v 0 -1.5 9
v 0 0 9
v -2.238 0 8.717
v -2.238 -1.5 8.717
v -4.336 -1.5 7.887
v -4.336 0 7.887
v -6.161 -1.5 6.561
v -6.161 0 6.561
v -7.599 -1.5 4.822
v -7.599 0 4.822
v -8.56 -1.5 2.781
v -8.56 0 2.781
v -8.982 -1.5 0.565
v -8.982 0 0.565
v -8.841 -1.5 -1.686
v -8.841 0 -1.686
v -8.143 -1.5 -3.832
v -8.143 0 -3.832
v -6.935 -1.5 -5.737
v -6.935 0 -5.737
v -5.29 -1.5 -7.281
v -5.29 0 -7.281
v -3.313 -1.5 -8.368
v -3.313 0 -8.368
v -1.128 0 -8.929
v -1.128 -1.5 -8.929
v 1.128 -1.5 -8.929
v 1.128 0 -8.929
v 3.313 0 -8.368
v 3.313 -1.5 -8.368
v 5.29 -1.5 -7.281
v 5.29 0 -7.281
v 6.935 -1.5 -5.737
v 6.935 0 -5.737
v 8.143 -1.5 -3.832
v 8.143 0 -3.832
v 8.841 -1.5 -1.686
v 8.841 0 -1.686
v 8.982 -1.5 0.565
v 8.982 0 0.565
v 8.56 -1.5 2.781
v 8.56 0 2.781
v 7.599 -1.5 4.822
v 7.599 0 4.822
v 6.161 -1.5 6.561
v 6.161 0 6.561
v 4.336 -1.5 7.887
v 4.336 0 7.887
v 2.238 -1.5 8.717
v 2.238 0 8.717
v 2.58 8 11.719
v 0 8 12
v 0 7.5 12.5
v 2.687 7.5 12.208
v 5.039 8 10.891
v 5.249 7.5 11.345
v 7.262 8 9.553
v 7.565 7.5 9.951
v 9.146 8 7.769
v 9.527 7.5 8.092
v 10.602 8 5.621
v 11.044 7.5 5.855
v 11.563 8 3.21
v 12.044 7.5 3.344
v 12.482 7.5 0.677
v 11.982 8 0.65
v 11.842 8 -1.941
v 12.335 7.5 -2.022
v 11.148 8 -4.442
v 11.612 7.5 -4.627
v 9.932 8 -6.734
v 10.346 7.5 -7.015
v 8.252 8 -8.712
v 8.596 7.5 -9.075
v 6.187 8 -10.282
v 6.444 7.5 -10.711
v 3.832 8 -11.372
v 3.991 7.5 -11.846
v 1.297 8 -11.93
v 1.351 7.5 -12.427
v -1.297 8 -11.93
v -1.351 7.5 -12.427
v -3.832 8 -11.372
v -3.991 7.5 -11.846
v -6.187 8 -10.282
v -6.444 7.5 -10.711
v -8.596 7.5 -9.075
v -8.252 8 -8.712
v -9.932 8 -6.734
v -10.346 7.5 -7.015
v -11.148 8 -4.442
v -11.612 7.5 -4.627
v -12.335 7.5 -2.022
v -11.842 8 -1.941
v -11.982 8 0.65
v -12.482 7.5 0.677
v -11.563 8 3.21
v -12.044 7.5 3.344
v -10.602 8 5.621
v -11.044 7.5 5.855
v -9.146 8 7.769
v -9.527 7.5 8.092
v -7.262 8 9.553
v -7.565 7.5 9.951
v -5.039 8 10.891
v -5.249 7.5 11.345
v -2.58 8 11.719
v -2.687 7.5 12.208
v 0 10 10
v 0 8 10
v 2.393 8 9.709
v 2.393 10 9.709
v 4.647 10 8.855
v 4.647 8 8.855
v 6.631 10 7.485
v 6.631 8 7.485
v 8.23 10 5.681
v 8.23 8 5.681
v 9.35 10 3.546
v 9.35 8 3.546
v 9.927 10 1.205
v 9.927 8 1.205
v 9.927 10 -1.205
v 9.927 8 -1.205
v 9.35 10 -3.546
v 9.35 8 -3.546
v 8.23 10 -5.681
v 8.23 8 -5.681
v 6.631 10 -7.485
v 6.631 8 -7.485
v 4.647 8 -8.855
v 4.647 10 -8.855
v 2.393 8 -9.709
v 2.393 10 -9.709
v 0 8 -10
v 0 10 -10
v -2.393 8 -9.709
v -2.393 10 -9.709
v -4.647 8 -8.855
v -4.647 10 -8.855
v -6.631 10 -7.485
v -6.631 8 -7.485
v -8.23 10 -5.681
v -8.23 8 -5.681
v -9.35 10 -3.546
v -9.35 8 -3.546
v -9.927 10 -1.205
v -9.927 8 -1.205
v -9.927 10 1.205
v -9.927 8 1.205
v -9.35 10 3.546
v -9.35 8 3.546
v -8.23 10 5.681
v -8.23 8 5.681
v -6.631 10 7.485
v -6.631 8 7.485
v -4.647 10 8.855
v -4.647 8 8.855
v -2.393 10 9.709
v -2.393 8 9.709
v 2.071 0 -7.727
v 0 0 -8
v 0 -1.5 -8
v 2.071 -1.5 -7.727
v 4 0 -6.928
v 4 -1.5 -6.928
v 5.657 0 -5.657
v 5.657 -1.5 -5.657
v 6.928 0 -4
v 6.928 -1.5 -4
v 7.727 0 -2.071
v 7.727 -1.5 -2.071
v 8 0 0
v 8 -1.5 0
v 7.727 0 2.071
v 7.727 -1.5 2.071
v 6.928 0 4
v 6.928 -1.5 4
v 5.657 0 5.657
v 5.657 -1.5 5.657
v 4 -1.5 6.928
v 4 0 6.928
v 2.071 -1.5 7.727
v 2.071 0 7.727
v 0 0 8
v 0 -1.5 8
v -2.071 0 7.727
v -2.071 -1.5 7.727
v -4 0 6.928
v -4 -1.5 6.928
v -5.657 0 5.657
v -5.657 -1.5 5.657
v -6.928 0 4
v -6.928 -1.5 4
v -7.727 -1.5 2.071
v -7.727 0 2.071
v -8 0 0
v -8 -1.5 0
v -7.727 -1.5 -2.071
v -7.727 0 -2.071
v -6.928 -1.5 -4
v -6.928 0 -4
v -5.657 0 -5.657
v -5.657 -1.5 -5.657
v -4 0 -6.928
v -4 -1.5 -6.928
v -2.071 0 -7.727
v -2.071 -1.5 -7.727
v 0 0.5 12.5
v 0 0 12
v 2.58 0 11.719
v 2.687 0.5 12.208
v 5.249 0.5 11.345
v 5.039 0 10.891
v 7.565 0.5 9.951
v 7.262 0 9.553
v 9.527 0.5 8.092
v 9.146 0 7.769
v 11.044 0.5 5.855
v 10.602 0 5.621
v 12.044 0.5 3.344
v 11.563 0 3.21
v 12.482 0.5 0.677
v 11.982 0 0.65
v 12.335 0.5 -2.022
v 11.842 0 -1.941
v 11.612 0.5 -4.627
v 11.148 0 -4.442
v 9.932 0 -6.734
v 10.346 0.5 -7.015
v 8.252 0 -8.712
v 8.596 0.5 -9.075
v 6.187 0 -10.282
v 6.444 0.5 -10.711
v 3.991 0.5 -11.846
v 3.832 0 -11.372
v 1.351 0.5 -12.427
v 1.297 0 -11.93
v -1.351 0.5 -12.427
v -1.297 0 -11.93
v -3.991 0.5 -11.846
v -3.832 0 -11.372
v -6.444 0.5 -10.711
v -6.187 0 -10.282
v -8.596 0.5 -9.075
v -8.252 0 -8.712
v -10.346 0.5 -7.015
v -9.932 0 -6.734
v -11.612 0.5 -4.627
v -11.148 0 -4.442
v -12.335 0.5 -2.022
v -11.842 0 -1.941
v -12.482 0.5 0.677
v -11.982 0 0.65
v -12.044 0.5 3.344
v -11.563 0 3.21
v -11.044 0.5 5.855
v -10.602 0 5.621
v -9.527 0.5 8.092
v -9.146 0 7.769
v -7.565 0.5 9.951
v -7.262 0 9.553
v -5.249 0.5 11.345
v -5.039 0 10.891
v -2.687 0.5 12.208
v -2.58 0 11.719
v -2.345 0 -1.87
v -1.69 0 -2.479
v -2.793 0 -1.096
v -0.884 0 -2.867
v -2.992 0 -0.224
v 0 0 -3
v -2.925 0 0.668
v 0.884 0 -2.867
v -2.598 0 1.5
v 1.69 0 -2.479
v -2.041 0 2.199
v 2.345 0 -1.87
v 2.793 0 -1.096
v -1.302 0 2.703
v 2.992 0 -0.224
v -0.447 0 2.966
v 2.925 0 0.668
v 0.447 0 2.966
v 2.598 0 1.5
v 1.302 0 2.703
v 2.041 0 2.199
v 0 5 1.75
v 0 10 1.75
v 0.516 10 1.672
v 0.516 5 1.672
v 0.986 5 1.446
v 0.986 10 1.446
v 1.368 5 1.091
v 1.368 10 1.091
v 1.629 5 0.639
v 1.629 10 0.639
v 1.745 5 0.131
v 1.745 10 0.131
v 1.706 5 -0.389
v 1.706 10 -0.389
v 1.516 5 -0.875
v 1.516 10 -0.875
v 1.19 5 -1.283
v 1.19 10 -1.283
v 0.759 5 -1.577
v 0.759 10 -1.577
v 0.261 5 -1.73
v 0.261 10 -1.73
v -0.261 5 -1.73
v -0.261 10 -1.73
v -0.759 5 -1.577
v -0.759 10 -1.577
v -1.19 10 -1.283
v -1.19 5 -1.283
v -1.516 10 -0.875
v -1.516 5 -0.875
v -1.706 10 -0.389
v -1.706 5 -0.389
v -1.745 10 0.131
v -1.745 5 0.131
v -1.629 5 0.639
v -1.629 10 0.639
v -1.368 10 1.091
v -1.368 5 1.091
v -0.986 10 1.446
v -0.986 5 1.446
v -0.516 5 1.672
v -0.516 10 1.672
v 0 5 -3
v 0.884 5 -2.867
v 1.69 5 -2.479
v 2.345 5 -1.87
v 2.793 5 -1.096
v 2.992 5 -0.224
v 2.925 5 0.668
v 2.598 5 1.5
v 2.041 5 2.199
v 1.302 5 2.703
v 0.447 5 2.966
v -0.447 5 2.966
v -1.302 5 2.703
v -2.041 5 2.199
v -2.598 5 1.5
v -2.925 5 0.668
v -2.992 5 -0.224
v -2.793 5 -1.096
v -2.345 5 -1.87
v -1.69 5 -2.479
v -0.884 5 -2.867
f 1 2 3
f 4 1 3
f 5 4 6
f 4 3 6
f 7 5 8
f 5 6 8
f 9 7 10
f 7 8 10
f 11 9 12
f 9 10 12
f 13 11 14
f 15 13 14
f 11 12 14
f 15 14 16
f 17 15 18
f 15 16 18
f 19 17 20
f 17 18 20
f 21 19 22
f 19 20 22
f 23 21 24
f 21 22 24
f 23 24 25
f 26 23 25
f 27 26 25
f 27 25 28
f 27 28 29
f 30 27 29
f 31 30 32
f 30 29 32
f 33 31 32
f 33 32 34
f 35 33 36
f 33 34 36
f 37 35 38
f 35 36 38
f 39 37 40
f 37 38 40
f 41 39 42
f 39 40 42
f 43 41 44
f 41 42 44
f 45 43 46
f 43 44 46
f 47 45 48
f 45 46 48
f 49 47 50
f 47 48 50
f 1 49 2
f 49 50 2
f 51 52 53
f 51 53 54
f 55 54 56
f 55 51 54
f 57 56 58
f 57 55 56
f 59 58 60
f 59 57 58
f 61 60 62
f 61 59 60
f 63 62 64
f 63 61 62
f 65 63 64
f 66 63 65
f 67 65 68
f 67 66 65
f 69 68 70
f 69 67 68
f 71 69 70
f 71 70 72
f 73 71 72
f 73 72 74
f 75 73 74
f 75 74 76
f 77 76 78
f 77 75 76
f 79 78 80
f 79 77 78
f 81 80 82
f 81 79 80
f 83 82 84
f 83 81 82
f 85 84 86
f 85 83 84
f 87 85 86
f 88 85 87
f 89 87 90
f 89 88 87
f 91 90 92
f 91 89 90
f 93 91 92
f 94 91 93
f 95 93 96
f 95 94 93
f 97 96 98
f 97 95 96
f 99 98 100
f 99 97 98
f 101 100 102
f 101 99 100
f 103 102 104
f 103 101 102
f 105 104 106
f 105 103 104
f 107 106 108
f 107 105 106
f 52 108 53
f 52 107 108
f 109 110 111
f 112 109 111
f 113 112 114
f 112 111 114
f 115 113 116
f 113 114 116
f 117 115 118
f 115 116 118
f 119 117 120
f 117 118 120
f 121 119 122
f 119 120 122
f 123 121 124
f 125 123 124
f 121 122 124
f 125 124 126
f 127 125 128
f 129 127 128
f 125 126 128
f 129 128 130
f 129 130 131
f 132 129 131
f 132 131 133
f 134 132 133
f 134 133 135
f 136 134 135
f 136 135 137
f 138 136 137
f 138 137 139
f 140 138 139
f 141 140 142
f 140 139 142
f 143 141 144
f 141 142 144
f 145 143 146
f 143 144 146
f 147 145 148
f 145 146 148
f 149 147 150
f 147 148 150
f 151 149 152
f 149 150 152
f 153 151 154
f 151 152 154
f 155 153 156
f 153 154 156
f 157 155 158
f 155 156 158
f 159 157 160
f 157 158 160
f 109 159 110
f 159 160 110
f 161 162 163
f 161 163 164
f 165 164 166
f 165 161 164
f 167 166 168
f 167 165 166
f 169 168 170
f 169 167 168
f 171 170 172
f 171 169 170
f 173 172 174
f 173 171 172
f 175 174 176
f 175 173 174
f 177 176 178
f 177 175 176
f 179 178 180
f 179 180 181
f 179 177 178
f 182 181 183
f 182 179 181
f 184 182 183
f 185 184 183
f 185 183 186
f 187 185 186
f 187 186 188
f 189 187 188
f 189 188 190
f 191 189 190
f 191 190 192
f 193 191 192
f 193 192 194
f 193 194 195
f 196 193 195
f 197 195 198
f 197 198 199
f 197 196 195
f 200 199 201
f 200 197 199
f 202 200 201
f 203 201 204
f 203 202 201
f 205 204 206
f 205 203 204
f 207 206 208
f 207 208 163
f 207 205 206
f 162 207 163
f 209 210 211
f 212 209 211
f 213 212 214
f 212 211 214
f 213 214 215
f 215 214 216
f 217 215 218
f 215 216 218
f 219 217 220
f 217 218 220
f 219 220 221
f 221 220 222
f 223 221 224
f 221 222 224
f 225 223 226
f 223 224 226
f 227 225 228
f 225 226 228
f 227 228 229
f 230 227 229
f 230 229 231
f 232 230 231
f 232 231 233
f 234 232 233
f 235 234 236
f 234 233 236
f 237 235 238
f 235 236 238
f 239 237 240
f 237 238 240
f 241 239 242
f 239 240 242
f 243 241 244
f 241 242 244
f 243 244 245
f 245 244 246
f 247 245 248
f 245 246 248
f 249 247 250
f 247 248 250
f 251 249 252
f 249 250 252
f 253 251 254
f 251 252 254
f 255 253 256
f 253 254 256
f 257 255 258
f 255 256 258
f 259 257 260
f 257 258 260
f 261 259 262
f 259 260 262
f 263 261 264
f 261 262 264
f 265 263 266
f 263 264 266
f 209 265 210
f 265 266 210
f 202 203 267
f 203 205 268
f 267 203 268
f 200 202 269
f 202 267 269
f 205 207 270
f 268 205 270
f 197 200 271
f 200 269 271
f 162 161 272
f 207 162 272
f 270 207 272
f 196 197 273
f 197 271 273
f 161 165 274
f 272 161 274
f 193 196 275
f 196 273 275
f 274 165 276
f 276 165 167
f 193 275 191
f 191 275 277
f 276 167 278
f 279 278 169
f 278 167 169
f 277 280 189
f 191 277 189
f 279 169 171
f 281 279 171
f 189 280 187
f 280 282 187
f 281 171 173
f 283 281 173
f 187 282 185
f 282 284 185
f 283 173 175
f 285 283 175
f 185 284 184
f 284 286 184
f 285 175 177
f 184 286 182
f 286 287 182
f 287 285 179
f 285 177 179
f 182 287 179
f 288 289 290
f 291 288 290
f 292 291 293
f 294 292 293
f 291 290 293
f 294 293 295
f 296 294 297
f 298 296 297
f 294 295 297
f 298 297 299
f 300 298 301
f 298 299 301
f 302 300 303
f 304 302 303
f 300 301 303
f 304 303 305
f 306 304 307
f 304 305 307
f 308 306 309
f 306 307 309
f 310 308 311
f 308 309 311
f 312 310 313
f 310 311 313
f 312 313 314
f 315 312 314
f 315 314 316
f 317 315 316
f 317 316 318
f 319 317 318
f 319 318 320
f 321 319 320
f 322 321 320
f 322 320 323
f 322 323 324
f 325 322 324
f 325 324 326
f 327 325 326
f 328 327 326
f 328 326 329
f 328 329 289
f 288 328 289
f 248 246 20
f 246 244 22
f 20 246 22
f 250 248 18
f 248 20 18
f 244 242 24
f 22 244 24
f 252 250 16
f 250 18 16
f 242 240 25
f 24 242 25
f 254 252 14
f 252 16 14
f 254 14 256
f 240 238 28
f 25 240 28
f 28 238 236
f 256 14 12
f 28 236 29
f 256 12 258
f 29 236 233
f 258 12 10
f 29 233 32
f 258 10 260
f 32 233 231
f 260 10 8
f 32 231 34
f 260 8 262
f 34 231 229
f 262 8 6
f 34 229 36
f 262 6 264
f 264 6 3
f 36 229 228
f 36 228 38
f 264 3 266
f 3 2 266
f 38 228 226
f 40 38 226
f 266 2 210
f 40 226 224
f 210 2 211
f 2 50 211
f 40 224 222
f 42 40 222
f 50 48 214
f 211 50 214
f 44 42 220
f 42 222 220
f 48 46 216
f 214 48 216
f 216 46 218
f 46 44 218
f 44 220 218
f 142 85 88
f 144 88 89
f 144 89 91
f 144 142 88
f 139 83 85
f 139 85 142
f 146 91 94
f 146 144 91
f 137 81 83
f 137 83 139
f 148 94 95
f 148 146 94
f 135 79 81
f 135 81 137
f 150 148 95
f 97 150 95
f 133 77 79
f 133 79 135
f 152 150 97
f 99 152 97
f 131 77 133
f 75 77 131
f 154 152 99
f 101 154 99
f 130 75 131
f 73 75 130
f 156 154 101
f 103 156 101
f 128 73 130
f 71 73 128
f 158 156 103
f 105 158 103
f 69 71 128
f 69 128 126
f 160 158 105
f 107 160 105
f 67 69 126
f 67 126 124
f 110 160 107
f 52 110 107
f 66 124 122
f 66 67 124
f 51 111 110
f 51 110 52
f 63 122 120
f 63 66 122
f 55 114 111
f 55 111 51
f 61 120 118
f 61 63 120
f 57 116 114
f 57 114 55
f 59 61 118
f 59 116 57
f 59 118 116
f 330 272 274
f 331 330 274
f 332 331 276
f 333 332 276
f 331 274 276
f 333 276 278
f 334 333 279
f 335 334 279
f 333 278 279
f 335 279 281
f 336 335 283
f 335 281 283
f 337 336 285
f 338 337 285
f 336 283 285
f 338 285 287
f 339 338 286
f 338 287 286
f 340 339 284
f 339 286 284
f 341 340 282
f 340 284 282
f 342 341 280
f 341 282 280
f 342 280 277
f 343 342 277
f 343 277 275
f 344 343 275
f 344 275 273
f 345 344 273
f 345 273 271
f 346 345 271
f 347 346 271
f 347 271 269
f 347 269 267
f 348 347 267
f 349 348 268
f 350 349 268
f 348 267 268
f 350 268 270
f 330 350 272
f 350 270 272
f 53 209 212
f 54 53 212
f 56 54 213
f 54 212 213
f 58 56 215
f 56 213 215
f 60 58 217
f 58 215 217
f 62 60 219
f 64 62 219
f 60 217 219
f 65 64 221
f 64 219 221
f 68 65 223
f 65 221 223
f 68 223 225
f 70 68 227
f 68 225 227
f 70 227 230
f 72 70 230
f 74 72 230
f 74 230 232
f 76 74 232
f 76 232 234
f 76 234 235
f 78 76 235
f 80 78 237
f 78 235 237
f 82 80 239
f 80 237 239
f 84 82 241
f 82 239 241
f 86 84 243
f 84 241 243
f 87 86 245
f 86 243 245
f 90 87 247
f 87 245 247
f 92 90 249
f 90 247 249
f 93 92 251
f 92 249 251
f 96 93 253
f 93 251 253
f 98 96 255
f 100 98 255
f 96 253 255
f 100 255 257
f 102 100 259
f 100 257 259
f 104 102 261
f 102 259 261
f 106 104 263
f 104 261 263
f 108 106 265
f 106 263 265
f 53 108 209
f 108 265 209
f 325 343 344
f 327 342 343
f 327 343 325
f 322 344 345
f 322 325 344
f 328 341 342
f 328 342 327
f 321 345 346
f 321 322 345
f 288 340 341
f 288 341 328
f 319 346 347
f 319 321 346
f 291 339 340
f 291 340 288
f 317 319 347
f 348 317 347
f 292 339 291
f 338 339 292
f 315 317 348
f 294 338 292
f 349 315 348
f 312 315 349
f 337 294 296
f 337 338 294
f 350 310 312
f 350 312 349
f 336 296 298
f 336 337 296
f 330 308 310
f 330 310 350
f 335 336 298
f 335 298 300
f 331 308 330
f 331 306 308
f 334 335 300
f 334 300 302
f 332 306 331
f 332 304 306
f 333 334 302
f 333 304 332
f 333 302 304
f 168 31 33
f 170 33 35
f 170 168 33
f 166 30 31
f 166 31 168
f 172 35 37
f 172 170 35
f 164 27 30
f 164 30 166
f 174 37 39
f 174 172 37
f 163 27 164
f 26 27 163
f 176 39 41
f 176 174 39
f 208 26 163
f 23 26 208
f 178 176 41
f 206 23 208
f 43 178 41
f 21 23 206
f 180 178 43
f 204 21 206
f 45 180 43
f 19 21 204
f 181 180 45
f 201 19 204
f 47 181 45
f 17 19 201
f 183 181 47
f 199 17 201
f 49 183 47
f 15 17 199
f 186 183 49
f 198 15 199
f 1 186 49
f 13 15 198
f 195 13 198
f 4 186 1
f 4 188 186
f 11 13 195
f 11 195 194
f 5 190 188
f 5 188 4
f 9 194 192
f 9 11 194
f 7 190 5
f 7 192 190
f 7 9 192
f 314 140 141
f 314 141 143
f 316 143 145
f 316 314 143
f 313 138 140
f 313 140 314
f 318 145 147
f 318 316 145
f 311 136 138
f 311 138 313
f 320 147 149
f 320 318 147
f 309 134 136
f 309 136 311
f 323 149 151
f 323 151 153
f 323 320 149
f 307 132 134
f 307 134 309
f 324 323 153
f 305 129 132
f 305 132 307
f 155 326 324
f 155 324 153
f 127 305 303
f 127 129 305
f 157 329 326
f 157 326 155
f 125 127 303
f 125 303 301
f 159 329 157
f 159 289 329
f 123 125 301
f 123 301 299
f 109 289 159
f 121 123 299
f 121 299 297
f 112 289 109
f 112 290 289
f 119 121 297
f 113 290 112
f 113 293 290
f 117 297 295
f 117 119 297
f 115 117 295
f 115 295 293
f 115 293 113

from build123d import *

# Parameters (mm, degrees)
SKETCH1_R           = 12.5
BOSS_EXTRUDE1_DEPTH = 8
SKETCH2_R           = 10
BOSS_EXTRUDE2_DEPTH = 2
CUT_EXTRUDE1_REACH  = 22.31
SKETCH3_R           = 1.75
SKETCH4_R           = 3
CUT_EXTRUDE2_DEPTH  = 5
SKETCH5_R           = 9
SKETCH5_R_2         = 8
BOSS_EXTRUDE3_DEPTH = 1.5
CHAMFER1_SIZE       = 0.5


with BuildPart() as part:
    # Sketch1 → Boss-Extrude1 (new body)
    with BuildSketch(Plane(origin=(0, 0, 0), x_dir=(1, 0, 0), z_dir=(0, 1, 0))):
        with Locations(Location((0, 0, 0), (0, 0, 270))):
            Circle(SKETCH1_R)
    extrude(amount=BOSS_EXTRUDE1_DEPTH)

    # Sketch2 → Boss-Extrude2 (add)
    with BuildSketch(Plane(origin=(0, 8, 0), x_dir=(1, 0, 0), z_dir=(0, 1, 0))):
        with Locations(Location((0, 0, 0), (0, 0, 270))):
            Circle(SKETCH2_R)
    extrude(amount=BOSS_EXTRUDE2_DEPTH)

    # Sketch3 → Cut-Extrude1 (cut, up to next)
    with BuildSketch(Plane(origin=(0, 10, 0), x_dir=(1, 0, 0), z_dir=(0, 1, 0)), mode=Mode.PRIVATE) as cut_extrude1_sk1:
        with Locations(Location((0, 0, 0), (0, 0, 270))):
            Circle(SKETCH3_R)
    cut_extrude1_tool1 = extrude(cut_extrude1_sk1.sketch, amount=-CUT_EXTRUDE1_REACH, mode=Mode.PRIVATE) & part.part
    add(cut_extrude1_tool1.solids().sort_by_distance((0, 10, 0))[0], mode=Mode.SUBTRACT)

    # Sketch4 → Cut-Extrude2 (cut)
    with BuildSketch(Plane.XZ):
        with Locations(Location((0, 0, 0), (0, 0, 270))):
            Circle(SKETCH4_R)
    extrude(amount=-CUT_EXTRUDE2_DEPTH, mode=Mode.SUBTRACT)

    # Sketch5 → Boss-Extrude3 (add)
    with BuildSketch(Plane.XZ):
        with Locations(Location((0, 0, 0), (0, 0, 90))):
            Circle(SKETCH5_R)
        with Locations(Location((0, 0, 0), (0, 0, 270))):
            Circle(SKETCH5_R_2, mode=Mode.SUBTRACT)
    extrude(amount=BOSS_EXTRUDE3_DEPTH)

    # Chamfer1
    chamfer1_edges = [part.edges().sort_by_distance(p)[0] for p in [
        (0, 0, -12.5),
        (0, 8, -12.5),
    ]]
    chamfer(chamfer1_edges, length=CHAMFER1_SIZE)


solid = part.part
